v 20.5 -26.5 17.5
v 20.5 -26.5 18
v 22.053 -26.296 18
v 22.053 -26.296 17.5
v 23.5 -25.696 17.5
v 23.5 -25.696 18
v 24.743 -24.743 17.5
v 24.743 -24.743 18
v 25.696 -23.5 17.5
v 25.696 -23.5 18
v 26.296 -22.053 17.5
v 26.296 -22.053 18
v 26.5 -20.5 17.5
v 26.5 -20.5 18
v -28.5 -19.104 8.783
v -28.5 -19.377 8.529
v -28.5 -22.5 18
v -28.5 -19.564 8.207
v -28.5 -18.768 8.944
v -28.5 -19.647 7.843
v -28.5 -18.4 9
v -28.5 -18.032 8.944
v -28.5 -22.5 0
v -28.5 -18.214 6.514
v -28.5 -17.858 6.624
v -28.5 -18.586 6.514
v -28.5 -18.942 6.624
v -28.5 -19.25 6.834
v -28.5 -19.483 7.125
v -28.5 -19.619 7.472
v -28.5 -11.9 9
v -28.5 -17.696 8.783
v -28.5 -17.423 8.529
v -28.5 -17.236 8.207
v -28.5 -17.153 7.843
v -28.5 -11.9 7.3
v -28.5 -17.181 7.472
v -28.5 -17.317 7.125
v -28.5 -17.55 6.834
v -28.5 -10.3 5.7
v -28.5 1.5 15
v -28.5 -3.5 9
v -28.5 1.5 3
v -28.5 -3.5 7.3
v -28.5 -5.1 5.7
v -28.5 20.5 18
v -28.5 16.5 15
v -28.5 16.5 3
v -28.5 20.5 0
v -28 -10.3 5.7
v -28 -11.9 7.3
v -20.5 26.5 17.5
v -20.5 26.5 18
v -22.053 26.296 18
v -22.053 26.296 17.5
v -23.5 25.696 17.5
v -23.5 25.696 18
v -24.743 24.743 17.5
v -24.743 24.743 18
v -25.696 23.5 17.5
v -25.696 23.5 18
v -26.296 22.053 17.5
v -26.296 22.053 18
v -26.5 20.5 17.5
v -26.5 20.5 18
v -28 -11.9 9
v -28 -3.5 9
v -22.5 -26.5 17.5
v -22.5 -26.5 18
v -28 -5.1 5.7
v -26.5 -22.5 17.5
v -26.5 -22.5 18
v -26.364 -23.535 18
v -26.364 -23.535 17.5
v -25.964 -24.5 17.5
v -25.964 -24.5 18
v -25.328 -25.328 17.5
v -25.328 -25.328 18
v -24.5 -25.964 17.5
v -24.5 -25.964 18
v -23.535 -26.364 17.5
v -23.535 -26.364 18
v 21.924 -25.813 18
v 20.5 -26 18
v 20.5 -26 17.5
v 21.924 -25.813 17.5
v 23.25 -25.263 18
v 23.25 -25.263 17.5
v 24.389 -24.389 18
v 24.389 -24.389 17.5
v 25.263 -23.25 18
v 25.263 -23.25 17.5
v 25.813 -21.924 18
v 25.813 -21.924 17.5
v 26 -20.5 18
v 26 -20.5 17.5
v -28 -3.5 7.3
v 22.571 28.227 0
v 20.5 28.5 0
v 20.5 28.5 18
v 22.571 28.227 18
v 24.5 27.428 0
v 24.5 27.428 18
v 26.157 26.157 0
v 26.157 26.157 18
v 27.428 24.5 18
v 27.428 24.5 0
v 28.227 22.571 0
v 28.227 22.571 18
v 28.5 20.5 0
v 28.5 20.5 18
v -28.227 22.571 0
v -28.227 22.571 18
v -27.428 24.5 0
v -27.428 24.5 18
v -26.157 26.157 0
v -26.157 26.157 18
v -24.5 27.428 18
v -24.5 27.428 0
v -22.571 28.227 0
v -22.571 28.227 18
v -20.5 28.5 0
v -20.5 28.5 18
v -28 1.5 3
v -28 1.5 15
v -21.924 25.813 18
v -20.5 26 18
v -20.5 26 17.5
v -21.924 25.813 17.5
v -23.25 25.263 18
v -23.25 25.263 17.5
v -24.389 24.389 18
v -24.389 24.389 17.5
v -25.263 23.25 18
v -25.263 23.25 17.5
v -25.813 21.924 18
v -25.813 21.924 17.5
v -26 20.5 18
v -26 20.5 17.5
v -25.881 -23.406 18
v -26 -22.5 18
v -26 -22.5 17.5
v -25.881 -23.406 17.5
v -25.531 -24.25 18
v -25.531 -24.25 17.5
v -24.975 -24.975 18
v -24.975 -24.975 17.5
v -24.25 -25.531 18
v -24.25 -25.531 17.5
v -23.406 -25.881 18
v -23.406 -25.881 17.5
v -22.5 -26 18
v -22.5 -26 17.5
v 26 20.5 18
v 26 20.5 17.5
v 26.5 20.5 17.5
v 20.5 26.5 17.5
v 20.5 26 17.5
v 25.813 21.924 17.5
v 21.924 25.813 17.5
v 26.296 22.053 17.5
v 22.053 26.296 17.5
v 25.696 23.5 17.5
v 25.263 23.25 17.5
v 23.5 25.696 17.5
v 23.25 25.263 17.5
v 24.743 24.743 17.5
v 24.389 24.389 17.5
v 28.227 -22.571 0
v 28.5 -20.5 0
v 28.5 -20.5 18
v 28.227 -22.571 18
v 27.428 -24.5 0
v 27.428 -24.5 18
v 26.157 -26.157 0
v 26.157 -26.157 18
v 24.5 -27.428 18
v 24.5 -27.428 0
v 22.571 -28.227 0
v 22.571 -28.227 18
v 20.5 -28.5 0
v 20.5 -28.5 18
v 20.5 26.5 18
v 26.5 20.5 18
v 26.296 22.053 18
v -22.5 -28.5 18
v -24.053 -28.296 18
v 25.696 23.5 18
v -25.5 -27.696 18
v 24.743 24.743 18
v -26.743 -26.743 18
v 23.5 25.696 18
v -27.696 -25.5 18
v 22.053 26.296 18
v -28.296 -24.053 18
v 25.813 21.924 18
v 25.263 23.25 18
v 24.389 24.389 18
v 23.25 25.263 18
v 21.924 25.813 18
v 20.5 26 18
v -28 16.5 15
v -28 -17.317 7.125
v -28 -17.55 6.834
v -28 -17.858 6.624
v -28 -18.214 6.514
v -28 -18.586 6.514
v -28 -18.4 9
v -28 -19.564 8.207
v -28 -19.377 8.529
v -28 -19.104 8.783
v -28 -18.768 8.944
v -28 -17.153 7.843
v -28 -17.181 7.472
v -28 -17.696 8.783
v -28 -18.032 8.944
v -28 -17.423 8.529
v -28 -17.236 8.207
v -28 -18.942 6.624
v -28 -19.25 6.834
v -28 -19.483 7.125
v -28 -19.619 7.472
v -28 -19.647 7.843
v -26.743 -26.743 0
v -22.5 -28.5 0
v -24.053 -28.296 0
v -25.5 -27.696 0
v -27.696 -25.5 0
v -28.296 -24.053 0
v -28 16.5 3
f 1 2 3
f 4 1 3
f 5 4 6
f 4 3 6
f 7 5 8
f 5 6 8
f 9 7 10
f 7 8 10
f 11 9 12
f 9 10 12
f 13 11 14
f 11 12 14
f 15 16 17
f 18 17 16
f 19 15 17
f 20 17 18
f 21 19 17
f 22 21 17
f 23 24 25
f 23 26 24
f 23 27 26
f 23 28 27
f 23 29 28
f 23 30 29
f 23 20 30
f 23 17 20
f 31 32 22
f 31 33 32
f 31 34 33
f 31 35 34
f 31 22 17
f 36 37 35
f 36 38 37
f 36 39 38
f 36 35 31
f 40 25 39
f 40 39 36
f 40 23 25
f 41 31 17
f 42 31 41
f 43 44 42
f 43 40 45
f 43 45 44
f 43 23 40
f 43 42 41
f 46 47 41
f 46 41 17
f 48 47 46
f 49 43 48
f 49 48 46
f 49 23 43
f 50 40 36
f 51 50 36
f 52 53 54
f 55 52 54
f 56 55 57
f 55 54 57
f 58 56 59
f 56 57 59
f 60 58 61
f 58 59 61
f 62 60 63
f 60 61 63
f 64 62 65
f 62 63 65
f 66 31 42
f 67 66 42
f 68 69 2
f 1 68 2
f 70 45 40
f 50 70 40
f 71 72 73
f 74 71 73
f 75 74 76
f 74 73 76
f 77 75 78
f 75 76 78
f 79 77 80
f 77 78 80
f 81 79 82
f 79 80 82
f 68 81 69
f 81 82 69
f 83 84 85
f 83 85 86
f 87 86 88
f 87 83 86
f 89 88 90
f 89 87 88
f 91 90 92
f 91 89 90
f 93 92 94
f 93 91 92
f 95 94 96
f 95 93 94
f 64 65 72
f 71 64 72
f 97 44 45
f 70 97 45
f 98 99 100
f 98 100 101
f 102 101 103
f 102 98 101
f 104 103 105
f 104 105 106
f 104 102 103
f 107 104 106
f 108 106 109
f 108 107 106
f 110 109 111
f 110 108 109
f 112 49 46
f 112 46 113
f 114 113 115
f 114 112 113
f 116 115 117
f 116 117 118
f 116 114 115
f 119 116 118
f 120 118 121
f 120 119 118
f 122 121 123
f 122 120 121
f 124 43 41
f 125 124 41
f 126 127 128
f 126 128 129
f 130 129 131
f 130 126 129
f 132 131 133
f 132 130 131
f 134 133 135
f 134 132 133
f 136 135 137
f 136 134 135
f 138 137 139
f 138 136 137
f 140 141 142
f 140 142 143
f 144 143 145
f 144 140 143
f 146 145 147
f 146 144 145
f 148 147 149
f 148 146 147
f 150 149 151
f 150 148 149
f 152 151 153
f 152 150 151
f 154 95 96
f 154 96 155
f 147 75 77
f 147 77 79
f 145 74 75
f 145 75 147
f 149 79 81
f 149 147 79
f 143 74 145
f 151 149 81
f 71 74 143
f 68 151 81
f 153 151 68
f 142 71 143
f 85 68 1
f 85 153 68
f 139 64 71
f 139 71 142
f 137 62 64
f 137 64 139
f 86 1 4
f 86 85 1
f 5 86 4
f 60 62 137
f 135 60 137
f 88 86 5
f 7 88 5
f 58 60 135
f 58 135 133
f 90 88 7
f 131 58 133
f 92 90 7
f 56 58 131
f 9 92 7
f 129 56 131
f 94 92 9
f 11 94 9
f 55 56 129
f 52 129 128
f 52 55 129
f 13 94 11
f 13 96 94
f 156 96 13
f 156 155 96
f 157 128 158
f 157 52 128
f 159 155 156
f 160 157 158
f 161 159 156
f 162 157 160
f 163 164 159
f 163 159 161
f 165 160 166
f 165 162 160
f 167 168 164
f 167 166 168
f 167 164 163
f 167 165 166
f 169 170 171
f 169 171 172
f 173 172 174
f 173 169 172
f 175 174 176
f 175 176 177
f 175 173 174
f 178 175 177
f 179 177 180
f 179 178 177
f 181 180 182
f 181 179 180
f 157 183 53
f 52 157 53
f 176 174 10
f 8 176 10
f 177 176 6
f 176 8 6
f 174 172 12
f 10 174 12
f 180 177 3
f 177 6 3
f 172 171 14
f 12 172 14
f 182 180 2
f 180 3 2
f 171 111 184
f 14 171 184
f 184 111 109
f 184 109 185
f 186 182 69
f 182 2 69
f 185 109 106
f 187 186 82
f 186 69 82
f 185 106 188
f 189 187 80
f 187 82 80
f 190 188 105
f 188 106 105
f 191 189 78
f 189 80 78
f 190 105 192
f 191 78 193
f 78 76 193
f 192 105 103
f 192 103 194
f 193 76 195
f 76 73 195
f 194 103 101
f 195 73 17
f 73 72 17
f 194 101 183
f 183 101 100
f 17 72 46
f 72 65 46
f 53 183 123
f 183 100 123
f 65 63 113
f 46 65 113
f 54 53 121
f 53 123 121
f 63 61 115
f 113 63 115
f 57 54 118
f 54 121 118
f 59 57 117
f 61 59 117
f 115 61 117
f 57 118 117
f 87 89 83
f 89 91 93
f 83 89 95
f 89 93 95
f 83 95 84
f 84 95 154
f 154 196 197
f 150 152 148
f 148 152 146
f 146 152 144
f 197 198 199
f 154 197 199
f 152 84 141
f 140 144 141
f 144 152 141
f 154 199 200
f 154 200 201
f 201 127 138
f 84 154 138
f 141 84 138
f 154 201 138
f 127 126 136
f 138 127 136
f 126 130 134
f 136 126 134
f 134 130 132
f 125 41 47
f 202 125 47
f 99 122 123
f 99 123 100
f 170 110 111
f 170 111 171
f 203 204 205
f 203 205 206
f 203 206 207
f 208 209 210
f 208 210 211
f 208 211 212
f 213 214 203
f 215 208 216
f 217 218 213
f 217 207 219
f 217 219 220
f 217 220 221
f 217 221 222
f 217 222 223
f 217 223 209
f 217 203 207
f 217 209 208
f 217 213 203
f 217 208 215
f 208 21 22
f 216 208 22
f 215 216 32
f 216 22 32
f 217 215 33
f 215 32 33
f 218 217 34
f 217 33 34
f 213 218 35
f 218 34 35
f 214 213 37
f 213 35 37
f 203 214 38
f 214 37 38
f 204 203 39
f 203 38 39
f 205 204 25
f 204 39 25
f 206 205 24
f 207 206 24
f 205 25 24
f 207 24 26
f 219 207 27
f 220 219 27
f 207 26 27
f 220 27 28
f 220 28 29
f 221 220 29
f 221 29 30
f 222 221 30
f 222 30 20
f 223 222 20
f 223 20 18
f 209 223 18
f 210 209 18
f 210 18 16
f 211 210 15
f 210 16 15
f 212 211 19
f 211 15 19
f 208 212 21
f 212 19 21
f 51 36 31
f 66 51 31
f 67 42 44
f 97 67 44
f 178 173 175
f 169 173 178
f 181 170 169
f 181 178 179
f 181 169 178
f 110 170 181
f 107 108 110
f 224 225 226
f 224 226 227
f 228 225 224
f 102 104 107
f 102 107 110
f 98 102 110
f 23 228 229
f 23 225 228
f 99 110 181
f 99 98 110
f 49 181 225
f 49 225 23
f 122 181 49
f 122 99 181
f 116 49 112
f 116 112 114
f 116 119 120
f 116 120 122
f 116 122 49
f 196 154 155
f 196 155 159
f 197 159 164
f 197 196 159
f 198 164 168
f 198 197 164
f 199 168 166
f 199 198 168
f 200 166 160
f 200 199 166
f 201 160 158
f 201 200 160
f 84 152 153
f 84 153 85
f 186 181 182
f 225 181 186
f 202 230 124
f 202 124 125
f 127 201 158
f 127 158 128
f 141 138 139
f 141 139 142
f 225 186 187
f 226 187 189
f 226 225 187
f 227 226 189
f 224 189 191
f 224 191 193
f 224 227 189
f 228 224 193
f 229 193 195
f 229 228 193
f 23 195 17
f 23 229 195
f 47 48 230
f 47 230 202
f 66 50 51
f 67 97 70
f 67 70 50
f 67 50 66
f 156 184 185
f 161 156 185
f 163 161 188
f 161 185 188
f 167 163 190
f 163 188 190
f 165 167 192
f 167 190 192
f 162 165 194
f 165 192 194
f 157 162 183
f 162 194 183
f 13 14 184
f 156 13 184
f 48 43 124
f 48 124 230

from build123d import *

# Parameters (mm, degrees)
SALIENTE_EXTRUIR1_DEPTH = 18
CORTAR_EXTRUIR1_DEPTH   = 0.5
CROQUIS3_R              = 1.25
CROQUIS3_W              = 12
CROQUIS3_H              = 15
CORTAR_EXTRUIR2_DEPTH   = 0.5


with BuildPart() as part:
    # Croquis1 → Saliente-Extruir1 (new body)
    with BuildSketch(Plane.XY):
        with BuildLine():
            Line((20.5, -28.5), (-22.5, -28.5))
            ThreePointArc((-22.5, -28.5), (-26.742640687, -26.742640687), (-28.5, -22.5))
            Line((-28.5, -22.5), (-28.5, 20.5))
            ThreePointArc((-28.5, 20.5), (-26.156854249, 26.156854249), (-20.5, 28.5))
            Line((-20.5, 28.5), (20.5, 28.5))
            ThreePointArc((20.5, 28.5), (26.156854249, 26.156854249), (28.5, 20.5))
            Line((28.5, 20.5), (28.5, -20.5))
            ThreePointArc((28.5, -20.5), (26.156854249, -26.156854249), (20.5, -28.5))
        make_face()
    extrude(amount=SALIENTE_EXTRUIR1_DEPTH)

    # Croquis2 → Cortar-Extruir1 (cut)
    with BuildSketch(Plane.XY.offset(18)):
        with BuildLine():
            Line((20.5, 26.5), (-20.5, 26.5))
            ThreePointArc((-20.5, 26.5), (-24.742640687, 24.742640687), (-26.5, 20.5))
            Line((-26.5, 20.5), (-26.5, -22.5))
            ThreePointArc((-26.5, -22.5), (-25.328427125, -25.328427125), (-22.5, -26.5))
            Line((-22.5, -26.5), (20.5, -26.5))
            ThreePointArc((20.5, -26.5), (24.742640687, -24.742640687), (26.5, -20.5))
            Line((26.5, -20.5), (26.5, 20.5))
            ThreePointArc((26.5, 20.5), (24.742640687, 24.742640687), (20.5, 26.5))
        make_face()
        with BuildLine():
            Line((-26, 20.5), (-26, -22.5))
            ThreePointArc((-26, -22.5), (-24.974873734, -24.974873734), (-22.5, -26))
            Line((-22.5, -26), (20.5, -26))
            ThreePointArc((20.5, -26), (24.389087297, -24.389087297), (26, -20.5))
            Line((26, -20.5), (26, 20.5))
            ThreePointArc((26, 20.5), (24.389087297, 24.389087297), (20.5, 26))
            Line((20.5, 26), (-20.5, 26))
            ThreePointArc((-20.5, 26), (-24.389087297, 24.389087297), (-26, 20.5))
        make_face(mode=Mode.SUBTRACT)
    extrude(amount=-CORTAR_EXTRUIR1_DEPTH, mode=Mode.SUBTRACT)

    # Croquis3 → Cortar-Extruir2 (cut)
    with BuildSketch(Plane.ZY.offset(28.5)):
        with Locations((7.75, -18.4)):
            Circle(CROQUIS3_R)
        with Locations((9, 9)):
            Rectangle(CROQUIS3_W, CROQUIS3_H)
        Polygon((9, -3.5), (7.3, -3.5), (5.7, -5.1), (5.7, -10.3), (7.3, -11.9), (9, -11.9), align=None)
    extrude(amount=-CORTAR_EXTRUIR2_DEPTH, mode=Mode.SUBTRACT)


solid = part.part
